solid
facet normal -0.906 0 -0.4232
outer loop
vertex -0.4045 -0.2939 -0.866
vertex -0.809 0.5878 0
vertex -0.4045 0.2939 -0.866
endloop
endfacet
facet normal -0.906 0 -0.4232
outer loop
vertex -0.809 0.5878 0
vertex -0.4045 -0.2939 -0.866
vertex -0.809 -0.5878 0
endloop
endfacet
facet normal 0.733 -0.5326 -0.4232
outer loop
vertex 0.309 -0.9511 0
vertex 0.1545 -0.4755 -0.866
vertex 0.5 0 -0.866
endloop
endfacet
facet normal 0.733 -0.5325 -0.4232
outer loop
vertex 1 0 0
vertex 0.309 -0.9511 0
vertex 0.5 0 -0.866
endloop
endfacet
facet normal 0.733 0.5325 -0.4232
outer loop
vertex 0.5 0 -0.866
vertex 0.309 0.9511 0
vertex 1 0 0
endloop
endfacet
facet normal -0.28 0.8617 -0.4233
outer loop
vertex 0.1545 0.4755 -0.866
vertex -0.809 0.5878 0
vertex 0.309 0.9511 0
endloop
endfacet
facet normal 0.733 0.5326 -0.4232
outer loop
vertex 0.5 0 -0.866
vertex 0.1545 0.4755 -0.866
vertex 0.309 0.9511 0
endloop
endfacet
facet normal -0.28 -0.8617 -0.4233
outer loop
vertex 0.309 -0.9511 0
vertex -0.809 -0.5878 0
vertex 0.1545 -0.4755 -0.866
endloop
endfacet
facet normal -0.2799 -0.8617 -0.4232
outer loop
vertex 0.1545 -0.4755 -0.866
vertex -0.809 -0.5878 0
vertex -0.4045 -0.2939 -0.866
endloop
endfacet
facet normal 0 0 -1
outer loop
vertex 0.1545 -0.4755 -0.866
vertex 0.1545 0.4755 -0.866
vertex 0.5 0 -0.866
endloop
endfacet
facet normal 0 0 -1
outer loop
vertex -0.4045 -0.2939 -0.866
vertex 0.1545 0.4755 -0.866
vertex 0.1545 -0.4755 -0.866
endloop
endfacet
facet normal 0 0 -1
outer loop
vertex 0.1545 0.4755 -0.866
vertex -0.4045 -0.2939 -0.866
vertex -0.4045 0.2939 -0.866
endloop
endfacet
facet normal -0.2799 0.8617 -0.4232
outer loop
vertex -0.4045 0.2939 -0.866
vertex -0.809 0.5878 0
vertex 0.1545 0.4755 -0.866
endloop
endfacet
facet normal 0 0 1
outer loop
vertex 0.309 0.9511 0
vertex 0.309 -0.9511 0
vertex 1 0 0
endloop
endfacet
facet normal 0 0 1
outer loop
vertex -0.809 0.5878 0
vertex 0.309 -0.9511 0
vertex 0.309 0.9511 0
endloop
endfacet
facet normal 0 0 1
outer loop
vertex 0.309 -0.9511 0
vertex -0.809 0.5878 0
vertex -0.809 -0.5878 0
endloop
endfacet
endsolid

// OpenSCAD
// Generated by SolidPython 1.1.3 on 2022-04-22 13:44:22


difference() {
	sphere(size = 100);
	cube(size = 150);
	cylinder(r = 50);
}
/***********************************************
*********      SolidPython code:      **********
************************************************
 
from solid import *
from solid.utils import *
import viewscad


d = cube(5) + right(5)(sphere(5)) - cylinder(r=2, h=6)

a = difference()(
    cube(100),  # Note the comma between each element!
    sphere(150),
    cylinder(50)
)
scad_render_to_file(a,'test_a.scad')
renderer = viewscad.Renderer(openscad_exec='./test_a.scad')
scad_render_to_file(d,'test_d.scad')
renderer = viewscad.Renderer(openscad_exec='./test_d.scad')
 
 
************************************************/
